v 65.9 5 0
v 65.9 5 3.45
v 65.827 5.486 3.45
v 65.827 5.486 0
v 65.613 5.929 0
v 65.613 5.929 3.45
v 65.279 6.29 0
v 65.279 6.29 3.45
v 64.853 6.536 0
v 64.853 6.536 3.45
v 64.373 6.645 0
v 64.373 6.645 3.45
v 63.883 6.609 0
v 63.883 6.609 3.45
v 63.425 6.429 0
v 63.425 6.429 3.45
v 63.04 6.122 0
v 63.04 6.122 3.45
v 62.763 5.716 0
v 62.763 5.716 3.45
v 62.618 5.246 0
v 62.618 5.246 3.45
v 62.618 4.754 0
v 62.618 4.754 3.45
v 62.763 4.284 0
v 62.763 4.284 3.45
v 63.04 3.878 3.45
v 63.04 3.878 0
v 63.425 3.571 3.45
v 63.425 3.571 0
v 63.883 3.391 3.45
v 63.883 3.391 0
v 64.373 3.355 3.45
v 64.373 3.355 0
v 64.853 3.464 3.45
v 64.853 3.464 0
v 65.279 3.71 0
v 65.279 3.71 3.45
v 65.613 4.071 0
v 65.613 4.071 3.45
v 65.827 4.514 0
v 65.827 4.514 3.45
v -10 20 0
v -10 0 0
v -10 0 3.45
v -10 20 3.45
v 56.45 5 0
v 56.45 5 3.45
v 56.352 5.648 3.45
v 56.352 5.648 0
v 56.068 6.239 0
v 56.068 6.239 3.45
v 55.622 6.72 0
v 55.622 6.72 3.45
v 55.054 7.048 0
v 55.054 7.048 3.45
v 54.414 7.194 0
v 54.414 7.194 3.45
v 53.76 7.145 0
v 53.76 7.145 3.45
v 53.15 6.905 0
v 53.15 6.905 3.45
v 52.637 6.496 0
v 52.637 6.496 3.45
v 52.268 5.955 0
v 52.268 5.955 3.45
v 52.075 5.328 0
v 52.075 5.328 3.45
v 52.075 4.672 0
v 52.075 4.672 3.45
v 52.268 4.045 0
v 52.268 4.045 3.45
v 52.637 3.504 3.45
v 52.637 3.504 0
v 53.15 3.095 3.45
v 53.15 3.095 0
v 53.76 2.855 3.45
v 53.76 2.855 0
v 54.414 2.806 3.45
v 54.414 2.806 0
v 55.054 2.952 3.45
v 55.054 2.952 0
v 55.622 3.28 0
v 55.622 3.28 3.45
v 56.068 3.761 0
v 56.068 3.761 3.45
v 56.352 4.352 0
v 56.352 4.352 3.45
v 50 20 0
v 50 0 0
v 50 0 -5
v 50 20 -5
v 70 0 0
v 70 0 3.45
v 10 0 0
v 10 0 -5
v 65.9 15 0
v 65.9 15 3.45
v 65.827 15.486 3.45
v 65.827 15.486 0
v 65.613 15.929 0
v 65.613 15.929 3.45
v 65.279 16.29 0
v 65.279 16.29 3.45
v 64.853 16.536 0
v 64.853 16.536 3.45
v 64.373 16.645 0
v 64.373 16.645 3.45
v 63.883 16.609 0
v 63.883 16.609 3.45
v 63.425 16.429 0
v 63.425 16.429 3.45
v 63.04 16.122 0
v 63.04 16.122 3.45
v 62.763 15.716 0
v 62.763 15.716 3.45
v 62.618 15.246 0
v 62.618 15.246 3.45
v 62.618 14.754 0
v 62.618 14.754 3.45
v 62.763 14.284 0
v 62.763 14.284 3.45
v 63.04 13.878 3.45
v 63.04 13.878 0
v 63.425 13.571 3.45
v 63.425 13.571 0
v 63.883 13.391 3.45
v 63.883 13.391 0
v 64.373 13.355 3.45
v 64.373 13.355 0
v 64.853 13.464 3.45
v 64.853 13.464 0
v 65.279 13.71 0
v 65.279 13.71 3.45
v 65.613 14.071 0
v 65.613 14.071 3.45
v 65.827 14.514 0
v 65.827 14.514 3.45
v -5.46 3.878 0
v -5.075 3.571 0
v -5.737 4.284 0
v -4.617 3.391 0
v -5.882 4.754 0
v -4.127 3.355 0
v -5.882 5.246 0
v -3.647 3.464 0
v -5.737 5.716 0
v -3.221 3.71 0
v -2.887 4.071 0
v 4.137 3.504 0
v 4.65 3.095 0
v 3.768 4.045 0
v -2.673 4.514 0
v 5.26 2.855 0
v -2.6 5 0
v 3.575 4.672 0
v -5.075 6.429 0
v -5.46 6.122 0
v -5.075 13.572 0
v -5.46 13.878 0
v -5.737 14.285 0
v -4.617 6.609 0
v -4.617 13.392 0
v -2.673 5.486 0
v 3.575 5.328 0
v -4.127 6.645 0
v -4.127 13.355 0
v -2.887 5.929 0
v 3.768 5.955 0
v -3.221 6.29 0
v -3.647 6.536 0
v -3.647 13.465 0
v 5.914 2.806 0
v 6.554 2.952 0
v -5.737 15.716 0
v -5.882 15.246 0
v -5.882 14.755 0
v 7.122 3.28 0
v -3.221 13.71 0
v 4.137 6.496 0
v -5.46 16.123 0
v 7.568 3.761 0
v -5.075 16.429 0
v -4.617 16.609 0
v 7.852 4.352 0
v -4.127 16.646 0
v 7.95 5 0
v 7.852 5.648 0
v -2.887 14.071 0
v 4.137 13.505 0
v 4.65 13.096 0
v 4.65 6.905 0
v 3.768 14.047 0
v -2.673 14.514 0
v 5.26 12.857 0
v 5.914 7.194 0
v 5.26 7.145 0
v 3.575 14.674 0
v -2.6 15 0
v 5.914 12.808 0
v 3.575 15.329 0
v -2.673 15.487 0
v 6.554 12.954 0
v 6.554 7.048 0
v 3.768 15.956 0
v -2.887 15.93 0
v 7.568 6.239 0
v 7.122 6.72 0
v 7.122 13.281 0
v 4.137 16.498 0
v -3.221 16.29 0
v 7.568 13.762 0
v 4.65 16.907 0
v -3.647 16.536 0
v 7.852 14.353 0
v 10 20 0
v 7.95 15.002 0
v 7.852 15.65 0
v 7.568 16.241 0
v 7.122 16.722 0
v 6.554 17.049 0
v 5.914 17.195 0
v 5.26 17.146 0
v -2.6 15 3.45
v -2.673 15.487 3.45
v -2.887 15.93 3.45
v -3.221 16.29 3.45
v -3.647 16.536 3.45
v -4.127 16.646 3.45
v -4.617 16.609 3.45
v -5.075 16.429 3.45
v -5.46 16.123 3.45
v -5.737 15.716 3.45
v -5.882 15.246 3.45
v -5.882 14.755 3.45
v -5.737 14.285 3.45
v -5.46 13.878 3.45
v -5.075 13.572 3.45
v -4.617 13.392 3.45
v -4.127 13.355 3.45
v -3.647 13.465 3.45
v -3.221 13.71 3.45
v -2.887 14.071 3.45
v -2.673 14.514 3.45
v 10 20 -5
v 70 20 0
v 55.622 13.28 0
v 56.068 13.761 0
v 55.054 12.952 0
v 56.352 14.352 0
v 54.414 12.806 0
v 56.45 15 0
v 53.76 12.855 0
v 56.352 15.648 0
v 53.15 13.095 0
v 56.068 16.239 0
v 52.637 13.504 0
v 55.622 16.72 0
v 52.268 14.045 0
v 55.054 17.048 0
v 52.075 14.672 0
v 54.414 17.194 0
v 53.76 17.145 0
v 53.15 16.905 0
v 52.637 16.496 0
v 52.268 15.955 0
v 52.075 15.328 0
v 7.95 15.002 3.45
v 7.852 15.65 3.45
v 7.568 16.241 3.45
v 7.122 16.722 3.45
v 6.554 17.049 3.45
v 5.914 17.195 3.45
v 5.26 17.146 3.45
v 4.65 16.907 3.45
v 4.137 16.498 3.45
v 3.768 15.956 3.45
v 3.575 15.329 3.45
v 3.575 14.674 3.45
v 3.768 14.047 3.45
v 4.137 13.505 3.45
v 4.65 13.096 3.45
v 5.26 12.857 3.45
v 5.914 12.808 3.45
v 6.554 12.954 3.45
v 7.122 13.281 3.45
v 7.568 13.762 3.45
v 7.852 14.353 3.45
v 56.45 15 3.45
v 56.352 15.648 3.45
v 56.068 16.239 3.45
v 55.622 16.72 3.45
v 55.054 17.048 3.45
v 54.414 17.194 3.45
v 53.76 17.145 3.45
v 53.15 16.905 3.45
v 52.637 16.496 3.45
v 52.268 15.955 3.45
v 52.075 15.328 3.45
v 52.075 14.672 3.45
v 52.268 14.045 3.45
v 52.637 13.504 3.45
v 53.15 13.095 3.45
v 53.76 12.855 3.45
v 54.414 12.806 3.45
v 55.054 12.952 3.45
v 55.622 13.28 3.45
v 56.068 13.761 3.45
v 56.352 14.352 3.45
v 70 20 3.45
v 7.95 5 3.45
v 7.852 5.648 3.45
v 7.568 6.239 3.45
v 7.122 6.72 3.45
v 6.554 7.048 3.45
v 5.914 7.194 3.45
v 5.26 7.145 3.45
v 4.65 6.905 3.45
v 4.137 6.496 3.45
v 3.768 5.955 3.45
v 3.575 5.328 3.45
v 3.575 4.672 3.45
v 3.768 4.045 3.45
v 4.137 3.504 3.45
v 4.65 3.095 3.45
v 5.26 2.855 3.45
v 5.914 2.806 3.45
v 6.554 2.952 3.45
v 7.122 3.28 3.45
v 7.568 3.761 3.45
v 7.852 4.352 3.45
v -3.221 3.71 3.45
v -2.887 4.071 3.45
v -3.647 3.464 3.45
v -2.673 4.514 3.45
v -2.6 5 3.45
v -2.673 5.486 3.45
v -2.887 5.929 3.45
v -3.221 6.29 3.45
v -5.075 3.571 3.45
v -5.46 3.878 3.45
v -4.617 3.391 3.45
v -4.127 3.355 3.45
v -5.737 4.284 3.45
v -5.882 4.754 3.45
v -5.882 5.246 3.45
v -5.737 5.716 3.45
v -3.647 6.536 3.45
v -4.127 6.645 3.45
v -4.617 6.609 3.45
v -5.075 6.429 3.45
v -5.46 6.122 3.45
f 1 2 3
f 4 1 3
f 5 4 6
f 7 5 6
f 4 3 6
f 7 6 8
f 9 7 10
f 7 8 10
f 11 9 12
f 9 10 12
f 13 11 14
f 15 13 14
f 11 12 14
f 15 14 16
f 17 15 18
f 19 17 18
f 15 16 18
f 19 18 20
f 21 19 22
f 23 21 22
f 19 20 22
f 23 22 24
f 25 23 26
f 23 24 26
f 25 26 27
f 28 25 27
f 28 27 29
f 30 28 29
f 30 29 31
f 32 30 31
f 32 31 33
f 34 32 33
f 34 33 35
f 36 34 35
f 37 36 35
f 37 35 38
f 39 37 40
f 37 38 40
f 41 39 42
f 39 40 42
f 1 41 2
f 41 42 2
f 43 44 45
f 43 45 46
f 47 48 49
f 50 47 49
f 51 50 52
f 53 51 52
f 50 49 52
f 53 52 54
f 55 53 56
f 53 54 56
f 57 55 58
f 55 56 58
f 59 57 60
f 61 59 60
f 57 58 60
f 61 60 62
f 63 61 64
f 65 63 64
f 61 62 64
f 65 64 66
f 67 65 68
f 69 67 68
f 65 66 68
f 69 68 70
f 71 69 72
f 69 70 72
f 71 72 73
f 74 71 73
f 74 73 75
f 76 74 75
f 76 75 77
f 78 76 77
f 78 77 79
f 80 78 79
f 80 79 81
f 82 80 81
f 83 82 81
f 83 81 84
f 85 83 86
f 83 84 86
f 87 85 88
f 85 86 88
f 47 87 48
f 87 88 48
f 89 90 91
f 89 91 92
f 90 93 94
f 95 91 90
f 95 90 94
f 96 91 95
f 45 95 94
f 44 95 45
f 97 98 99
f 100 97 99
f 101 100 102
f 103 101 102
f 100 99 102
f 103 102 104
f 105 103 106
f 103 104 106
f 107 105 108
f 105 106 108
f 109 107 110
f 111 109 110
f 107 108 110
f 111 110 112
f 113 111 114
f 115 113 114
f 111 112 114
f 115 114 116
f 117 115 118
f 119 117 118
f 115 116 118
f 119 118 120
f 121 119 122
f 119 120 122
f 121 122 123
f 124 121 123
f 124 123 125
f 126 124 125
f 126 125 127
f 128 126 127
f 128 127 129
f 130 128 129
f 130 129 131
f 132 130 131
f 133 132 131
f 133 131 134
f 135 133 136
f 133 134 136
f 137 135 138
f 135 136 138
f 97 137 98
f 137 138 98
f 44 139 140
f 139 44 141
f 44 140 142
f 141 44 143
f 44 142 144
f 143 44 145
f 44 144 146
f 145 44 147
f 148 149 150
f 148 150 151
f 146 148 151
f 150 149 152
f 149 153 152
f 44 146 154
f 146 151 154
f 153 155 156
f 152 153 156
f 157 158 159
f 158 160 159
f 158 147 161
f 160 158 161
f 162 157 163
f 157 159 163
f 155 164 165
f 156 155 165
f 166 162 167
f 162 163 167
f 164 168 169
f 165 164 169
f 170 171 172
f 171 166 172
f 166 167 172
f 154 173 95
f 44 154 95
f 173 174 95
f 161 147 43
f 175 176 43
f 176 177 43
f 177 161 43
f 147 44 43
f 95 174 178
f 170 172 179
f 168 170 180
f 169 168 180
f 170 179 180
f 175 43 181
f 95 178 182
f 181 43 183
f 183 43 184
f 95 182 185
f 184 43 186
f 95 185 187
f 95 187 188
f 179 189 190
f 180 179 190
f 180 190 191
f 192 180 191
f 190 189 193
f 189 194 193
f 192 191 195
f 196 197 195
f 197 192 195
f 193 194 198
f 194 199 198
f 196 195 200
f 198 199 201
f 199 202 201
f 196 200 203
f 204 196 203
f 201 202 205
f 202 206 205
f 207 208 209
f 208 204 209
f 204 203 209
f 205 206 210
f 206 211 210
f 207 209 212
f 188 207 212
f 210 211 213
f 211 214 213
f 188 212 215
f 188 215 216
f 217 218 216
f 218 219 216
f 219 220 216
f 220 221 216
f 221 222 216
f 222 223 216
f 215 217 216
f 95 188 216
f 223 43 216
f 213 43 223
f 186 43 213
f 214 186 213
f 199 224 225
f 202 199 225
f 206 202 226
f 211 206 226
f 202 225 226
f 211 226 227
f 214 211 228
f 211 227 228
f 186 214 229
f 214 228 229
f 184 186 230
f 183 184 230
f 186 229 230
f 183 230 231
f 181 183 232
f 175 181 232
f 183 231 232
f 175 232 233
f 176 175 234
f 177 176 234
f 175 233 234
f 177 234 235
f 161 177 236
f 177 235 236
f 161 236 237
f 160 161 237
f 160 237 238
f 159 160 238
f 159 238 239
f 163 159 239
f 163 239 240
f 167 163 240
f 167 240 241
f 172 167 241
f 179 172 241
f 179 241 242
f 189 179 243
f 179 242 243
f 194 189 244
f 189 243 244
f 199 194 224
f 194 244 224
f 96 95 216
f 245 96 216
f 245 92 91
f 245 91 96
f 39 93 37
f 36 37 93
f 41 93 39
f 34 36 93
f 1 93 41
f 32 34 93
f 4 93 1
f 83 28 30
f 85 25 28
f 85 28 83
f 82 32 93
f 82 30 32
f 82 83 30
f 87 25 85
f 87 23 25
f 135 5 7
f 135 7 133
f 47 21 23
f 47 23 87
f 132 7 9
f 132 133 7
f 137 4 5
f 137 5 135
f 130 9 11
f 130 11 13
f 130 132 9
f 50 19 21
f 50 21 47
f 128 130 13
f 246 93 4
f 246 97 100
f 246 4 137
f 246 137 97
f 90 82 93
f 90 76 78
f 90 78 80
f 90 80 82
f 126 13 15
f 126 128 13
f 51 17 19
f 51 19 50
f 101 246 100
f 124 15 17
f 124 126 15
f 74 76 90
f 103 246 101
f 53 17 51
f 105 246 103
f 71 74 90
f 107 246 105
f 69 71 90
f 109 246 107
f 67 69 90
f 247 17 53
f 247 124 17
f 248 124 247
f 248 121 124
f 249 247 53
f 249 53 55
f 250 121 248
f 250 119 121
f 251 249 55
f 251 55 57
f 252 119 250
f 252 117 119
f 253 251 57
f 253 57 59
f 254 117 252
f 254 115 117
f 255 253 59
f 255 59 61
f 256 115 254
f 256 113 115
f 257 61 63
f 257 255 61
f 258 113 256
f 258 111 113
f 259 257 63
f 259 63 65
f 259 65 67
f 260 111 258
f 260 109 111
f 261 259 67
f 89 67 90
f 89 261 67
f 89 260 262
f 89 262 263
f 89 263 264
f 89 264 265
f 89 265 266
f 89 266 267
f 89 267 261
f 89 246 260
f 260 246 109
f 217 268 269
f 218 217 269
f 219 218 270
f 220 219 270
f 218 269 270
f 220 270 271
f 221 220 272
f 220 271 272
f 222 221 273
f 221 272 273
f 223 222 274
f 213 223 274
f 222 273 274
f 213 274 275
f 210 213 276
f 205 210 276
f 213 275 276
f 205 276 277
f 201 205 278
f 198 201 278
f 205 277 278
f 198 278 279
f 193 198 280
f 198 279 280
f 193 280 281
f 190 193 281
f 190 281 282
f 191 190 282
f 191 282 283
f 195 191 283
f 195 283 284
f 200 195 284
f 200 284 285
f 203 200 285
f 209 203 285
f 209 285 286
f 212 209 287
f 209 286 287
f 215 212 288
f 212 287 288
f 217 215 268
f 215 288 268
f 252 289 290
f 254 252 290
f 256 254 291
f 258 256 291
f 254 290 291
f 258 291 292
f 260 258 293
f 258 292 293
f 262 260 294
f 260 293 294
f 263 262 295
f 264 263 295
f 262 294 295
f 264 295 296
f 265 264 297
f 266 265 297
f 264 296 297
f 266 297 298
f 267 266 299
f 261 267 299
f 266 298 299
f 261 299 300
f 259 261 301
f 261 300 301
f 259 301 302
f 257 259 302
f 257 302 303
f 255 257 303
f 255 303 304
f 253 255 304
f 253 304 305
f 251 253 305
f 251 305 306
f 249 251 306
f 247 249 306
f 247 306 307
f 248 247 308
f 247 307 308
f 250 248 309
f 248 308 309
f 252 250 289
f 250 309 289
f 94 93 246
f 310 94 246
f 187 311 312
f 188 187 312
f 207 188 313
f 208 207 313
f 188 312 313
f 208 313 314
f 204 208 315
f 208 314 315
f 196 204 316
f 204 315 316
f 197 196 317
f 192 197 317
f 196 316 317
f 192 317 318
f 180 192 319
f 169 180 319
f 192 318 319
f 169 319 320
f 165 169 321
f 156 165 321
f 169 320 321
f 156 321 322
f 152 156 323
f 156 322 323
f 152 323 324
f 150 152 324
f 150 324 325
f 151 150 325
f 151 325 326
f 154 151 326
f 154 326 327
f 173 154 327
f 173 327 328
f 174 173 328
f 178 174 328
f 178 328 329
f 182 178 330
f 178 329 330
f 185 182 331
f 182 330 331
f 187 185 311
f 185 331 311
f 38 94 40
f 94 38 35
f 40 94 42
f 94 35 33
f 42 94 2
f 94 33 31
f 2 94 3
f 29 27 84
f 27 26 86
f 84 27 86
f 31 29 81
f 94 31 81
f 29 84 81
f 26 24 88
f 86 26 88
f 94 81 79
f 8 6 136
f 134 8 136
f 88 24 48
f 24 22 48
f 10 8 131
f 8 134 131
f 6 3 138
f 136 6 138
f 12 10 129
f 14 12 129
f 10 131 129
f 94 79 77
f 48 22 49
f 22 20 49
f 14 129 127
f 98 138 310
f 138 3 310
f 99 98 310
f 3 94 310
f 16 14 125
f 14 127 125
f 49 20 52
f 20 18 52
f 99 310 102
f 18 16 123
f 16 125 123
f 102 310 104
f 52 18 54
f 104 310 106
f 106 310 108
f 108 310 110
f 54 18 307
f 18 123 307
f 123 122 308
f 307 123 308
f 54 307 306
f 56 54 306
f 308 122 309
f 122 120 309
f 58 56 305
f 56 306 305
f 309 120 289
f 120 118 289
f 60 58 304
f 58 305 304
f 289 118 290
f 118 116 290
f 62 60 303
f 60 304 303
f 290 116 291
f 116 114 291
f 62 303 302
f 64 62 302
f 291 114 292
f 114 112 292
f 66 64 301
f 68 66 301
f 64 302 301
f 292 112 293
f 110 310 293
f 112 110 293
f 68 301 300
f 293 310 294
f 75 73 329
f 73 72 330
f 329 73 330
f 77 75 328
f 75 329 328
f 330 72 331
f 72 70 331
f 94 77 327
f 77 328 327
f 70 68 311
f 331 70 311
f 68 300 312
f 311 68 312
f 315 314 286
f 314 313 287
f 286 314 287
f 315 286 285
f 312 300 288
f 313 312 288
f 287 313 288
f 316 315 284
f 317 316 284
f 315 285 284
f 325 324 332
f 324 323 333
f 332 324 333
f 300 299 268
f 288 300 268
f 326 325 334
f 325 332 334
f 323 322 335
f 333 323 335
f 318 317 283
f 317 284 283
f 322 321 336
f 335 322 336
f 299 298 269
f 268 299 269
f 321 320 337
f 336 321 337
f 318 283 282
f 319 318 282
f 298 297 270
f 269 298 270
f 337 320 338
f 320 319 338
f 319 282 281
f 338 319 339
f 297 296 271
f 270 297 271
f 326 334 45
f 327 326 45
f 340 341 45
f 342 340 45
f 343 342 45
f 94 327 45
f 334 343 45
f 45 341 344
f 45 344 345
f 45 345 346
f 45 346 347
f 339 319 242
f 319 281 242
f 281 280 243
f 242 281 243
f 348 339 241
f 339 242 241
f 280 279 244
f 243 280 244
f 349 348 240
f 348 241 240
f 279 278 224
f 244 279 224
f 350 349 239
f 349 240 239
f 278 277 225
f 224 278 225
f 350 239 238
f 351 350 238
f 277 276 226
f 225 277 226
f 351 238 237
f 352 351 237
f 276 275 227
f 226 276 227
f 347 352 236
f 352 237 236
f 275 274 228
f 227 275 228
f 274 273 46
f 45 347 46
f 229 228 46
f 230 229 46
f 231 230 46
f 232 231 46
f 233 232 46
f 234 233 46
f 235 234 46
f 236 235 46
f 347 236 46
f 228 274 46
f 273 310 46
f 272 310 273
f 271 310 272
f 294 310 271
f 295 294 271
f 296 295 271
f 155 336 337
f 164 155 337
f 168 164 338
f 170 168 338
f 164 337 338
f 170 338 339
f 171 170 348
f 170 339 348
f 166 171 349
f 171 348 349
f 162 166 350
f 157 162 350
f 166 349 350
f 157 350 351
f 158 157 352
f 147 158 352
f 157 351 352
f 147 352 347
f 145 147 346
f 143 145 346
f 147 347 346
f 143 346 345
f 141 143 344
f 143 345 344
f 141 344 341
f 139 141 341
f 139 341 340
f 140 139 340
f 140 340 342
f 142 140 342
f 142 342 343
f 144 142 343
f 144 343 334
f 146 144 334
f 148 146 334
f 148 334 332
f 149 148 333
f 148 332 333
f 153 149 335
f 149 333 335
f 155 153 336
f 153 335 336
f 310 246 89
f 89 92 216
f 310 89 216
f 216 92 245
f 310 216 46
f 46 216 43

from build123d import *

# Parameters (mm, degrees)
SKETCH_1_W          = 60
SKETCH_1_H          = 20
EXTRUDE_1_DEPTH     = 3.45
SKETCH_2_W          = 40
SKETCH_2_H          = 20
EXTRUDE_2_DEPTH     = 5
SKETCH_4_W          = 80
SKETCH_4_H          = 20
EXTRUDE_3_DEPTH     = 3.45
SKETCH_7_R          = 2.2
SKETCH_7_R_2        = 1.65
CUT_EXTRUDE_1_DEPTH = 3.45


with BuildPart() as part:
    # 草图1 → 凸台-拉伸1 (new body)
    with BuildSketch(Plane.XY):
        with Locations((30, 10)):
            Rectangle(SKETCH_1_W, SKETCH_1_H)
    extrude(amount=EXTRUDE_1_DEPTH)

    # 草图2 → 凸台-拉伸2 (add)
    with BuildSketch(Plane(origin=(0, 0, 0), x_dir=(-1, 0, 0), z_dir=(0, 0, -1))):
        with Locations((-30, 10)):
            Rectangle(SKETCH_2_W, SKETCH_2_H)
    extrude(amount=EXTRUDE_2_DEPTH)

    # 草图4 → 凸台-拉伸3 (add)
    with BuildSketch(Plane(origin=(0, 0, 0), x_dir=(-1, 0, 0), z_dir=(0, 0, -1))):
        with Locations((-30, 10)):
            Rectangle(SKETCH_4_W, SKETCH_4_H)
    extrude(amount=-EXTRUDE_3_DEPTH)

    # 草图7 → 切除-拉伸1 (cut)
    with BuildSketch(Plane.XY.offset(3.45)):
        with Locations((5.75, 15.001516812)):
            Circle(SKETCH_7_R)
        with Locations((54.25, 15)):
            Circle(SKETCH_7_R)
        with Locations((54.25, 5)):
            Circle(SKETCH_7_R)
        with Locations((5.75, 5)):
            Circle(SKETCH_7_R)
        with Locations((-4.249999943, 15.000444876)):
            Circle(SKETCH_7_R_2)
        with Locations((-4.249999943, 5)):
            Circle(SKETCH_7_R_2)
        with Locations((64.25, 5)):
            Circle(SKETCH_7_R_2)
        with Locations((64.25, 15)):
            Circle(SKETCH_7_R_2)
    extrude(amount=-CUT_EXTRUDE_1_DEPTH, mode=Mode.SUBTRACT)


solid = part.part
